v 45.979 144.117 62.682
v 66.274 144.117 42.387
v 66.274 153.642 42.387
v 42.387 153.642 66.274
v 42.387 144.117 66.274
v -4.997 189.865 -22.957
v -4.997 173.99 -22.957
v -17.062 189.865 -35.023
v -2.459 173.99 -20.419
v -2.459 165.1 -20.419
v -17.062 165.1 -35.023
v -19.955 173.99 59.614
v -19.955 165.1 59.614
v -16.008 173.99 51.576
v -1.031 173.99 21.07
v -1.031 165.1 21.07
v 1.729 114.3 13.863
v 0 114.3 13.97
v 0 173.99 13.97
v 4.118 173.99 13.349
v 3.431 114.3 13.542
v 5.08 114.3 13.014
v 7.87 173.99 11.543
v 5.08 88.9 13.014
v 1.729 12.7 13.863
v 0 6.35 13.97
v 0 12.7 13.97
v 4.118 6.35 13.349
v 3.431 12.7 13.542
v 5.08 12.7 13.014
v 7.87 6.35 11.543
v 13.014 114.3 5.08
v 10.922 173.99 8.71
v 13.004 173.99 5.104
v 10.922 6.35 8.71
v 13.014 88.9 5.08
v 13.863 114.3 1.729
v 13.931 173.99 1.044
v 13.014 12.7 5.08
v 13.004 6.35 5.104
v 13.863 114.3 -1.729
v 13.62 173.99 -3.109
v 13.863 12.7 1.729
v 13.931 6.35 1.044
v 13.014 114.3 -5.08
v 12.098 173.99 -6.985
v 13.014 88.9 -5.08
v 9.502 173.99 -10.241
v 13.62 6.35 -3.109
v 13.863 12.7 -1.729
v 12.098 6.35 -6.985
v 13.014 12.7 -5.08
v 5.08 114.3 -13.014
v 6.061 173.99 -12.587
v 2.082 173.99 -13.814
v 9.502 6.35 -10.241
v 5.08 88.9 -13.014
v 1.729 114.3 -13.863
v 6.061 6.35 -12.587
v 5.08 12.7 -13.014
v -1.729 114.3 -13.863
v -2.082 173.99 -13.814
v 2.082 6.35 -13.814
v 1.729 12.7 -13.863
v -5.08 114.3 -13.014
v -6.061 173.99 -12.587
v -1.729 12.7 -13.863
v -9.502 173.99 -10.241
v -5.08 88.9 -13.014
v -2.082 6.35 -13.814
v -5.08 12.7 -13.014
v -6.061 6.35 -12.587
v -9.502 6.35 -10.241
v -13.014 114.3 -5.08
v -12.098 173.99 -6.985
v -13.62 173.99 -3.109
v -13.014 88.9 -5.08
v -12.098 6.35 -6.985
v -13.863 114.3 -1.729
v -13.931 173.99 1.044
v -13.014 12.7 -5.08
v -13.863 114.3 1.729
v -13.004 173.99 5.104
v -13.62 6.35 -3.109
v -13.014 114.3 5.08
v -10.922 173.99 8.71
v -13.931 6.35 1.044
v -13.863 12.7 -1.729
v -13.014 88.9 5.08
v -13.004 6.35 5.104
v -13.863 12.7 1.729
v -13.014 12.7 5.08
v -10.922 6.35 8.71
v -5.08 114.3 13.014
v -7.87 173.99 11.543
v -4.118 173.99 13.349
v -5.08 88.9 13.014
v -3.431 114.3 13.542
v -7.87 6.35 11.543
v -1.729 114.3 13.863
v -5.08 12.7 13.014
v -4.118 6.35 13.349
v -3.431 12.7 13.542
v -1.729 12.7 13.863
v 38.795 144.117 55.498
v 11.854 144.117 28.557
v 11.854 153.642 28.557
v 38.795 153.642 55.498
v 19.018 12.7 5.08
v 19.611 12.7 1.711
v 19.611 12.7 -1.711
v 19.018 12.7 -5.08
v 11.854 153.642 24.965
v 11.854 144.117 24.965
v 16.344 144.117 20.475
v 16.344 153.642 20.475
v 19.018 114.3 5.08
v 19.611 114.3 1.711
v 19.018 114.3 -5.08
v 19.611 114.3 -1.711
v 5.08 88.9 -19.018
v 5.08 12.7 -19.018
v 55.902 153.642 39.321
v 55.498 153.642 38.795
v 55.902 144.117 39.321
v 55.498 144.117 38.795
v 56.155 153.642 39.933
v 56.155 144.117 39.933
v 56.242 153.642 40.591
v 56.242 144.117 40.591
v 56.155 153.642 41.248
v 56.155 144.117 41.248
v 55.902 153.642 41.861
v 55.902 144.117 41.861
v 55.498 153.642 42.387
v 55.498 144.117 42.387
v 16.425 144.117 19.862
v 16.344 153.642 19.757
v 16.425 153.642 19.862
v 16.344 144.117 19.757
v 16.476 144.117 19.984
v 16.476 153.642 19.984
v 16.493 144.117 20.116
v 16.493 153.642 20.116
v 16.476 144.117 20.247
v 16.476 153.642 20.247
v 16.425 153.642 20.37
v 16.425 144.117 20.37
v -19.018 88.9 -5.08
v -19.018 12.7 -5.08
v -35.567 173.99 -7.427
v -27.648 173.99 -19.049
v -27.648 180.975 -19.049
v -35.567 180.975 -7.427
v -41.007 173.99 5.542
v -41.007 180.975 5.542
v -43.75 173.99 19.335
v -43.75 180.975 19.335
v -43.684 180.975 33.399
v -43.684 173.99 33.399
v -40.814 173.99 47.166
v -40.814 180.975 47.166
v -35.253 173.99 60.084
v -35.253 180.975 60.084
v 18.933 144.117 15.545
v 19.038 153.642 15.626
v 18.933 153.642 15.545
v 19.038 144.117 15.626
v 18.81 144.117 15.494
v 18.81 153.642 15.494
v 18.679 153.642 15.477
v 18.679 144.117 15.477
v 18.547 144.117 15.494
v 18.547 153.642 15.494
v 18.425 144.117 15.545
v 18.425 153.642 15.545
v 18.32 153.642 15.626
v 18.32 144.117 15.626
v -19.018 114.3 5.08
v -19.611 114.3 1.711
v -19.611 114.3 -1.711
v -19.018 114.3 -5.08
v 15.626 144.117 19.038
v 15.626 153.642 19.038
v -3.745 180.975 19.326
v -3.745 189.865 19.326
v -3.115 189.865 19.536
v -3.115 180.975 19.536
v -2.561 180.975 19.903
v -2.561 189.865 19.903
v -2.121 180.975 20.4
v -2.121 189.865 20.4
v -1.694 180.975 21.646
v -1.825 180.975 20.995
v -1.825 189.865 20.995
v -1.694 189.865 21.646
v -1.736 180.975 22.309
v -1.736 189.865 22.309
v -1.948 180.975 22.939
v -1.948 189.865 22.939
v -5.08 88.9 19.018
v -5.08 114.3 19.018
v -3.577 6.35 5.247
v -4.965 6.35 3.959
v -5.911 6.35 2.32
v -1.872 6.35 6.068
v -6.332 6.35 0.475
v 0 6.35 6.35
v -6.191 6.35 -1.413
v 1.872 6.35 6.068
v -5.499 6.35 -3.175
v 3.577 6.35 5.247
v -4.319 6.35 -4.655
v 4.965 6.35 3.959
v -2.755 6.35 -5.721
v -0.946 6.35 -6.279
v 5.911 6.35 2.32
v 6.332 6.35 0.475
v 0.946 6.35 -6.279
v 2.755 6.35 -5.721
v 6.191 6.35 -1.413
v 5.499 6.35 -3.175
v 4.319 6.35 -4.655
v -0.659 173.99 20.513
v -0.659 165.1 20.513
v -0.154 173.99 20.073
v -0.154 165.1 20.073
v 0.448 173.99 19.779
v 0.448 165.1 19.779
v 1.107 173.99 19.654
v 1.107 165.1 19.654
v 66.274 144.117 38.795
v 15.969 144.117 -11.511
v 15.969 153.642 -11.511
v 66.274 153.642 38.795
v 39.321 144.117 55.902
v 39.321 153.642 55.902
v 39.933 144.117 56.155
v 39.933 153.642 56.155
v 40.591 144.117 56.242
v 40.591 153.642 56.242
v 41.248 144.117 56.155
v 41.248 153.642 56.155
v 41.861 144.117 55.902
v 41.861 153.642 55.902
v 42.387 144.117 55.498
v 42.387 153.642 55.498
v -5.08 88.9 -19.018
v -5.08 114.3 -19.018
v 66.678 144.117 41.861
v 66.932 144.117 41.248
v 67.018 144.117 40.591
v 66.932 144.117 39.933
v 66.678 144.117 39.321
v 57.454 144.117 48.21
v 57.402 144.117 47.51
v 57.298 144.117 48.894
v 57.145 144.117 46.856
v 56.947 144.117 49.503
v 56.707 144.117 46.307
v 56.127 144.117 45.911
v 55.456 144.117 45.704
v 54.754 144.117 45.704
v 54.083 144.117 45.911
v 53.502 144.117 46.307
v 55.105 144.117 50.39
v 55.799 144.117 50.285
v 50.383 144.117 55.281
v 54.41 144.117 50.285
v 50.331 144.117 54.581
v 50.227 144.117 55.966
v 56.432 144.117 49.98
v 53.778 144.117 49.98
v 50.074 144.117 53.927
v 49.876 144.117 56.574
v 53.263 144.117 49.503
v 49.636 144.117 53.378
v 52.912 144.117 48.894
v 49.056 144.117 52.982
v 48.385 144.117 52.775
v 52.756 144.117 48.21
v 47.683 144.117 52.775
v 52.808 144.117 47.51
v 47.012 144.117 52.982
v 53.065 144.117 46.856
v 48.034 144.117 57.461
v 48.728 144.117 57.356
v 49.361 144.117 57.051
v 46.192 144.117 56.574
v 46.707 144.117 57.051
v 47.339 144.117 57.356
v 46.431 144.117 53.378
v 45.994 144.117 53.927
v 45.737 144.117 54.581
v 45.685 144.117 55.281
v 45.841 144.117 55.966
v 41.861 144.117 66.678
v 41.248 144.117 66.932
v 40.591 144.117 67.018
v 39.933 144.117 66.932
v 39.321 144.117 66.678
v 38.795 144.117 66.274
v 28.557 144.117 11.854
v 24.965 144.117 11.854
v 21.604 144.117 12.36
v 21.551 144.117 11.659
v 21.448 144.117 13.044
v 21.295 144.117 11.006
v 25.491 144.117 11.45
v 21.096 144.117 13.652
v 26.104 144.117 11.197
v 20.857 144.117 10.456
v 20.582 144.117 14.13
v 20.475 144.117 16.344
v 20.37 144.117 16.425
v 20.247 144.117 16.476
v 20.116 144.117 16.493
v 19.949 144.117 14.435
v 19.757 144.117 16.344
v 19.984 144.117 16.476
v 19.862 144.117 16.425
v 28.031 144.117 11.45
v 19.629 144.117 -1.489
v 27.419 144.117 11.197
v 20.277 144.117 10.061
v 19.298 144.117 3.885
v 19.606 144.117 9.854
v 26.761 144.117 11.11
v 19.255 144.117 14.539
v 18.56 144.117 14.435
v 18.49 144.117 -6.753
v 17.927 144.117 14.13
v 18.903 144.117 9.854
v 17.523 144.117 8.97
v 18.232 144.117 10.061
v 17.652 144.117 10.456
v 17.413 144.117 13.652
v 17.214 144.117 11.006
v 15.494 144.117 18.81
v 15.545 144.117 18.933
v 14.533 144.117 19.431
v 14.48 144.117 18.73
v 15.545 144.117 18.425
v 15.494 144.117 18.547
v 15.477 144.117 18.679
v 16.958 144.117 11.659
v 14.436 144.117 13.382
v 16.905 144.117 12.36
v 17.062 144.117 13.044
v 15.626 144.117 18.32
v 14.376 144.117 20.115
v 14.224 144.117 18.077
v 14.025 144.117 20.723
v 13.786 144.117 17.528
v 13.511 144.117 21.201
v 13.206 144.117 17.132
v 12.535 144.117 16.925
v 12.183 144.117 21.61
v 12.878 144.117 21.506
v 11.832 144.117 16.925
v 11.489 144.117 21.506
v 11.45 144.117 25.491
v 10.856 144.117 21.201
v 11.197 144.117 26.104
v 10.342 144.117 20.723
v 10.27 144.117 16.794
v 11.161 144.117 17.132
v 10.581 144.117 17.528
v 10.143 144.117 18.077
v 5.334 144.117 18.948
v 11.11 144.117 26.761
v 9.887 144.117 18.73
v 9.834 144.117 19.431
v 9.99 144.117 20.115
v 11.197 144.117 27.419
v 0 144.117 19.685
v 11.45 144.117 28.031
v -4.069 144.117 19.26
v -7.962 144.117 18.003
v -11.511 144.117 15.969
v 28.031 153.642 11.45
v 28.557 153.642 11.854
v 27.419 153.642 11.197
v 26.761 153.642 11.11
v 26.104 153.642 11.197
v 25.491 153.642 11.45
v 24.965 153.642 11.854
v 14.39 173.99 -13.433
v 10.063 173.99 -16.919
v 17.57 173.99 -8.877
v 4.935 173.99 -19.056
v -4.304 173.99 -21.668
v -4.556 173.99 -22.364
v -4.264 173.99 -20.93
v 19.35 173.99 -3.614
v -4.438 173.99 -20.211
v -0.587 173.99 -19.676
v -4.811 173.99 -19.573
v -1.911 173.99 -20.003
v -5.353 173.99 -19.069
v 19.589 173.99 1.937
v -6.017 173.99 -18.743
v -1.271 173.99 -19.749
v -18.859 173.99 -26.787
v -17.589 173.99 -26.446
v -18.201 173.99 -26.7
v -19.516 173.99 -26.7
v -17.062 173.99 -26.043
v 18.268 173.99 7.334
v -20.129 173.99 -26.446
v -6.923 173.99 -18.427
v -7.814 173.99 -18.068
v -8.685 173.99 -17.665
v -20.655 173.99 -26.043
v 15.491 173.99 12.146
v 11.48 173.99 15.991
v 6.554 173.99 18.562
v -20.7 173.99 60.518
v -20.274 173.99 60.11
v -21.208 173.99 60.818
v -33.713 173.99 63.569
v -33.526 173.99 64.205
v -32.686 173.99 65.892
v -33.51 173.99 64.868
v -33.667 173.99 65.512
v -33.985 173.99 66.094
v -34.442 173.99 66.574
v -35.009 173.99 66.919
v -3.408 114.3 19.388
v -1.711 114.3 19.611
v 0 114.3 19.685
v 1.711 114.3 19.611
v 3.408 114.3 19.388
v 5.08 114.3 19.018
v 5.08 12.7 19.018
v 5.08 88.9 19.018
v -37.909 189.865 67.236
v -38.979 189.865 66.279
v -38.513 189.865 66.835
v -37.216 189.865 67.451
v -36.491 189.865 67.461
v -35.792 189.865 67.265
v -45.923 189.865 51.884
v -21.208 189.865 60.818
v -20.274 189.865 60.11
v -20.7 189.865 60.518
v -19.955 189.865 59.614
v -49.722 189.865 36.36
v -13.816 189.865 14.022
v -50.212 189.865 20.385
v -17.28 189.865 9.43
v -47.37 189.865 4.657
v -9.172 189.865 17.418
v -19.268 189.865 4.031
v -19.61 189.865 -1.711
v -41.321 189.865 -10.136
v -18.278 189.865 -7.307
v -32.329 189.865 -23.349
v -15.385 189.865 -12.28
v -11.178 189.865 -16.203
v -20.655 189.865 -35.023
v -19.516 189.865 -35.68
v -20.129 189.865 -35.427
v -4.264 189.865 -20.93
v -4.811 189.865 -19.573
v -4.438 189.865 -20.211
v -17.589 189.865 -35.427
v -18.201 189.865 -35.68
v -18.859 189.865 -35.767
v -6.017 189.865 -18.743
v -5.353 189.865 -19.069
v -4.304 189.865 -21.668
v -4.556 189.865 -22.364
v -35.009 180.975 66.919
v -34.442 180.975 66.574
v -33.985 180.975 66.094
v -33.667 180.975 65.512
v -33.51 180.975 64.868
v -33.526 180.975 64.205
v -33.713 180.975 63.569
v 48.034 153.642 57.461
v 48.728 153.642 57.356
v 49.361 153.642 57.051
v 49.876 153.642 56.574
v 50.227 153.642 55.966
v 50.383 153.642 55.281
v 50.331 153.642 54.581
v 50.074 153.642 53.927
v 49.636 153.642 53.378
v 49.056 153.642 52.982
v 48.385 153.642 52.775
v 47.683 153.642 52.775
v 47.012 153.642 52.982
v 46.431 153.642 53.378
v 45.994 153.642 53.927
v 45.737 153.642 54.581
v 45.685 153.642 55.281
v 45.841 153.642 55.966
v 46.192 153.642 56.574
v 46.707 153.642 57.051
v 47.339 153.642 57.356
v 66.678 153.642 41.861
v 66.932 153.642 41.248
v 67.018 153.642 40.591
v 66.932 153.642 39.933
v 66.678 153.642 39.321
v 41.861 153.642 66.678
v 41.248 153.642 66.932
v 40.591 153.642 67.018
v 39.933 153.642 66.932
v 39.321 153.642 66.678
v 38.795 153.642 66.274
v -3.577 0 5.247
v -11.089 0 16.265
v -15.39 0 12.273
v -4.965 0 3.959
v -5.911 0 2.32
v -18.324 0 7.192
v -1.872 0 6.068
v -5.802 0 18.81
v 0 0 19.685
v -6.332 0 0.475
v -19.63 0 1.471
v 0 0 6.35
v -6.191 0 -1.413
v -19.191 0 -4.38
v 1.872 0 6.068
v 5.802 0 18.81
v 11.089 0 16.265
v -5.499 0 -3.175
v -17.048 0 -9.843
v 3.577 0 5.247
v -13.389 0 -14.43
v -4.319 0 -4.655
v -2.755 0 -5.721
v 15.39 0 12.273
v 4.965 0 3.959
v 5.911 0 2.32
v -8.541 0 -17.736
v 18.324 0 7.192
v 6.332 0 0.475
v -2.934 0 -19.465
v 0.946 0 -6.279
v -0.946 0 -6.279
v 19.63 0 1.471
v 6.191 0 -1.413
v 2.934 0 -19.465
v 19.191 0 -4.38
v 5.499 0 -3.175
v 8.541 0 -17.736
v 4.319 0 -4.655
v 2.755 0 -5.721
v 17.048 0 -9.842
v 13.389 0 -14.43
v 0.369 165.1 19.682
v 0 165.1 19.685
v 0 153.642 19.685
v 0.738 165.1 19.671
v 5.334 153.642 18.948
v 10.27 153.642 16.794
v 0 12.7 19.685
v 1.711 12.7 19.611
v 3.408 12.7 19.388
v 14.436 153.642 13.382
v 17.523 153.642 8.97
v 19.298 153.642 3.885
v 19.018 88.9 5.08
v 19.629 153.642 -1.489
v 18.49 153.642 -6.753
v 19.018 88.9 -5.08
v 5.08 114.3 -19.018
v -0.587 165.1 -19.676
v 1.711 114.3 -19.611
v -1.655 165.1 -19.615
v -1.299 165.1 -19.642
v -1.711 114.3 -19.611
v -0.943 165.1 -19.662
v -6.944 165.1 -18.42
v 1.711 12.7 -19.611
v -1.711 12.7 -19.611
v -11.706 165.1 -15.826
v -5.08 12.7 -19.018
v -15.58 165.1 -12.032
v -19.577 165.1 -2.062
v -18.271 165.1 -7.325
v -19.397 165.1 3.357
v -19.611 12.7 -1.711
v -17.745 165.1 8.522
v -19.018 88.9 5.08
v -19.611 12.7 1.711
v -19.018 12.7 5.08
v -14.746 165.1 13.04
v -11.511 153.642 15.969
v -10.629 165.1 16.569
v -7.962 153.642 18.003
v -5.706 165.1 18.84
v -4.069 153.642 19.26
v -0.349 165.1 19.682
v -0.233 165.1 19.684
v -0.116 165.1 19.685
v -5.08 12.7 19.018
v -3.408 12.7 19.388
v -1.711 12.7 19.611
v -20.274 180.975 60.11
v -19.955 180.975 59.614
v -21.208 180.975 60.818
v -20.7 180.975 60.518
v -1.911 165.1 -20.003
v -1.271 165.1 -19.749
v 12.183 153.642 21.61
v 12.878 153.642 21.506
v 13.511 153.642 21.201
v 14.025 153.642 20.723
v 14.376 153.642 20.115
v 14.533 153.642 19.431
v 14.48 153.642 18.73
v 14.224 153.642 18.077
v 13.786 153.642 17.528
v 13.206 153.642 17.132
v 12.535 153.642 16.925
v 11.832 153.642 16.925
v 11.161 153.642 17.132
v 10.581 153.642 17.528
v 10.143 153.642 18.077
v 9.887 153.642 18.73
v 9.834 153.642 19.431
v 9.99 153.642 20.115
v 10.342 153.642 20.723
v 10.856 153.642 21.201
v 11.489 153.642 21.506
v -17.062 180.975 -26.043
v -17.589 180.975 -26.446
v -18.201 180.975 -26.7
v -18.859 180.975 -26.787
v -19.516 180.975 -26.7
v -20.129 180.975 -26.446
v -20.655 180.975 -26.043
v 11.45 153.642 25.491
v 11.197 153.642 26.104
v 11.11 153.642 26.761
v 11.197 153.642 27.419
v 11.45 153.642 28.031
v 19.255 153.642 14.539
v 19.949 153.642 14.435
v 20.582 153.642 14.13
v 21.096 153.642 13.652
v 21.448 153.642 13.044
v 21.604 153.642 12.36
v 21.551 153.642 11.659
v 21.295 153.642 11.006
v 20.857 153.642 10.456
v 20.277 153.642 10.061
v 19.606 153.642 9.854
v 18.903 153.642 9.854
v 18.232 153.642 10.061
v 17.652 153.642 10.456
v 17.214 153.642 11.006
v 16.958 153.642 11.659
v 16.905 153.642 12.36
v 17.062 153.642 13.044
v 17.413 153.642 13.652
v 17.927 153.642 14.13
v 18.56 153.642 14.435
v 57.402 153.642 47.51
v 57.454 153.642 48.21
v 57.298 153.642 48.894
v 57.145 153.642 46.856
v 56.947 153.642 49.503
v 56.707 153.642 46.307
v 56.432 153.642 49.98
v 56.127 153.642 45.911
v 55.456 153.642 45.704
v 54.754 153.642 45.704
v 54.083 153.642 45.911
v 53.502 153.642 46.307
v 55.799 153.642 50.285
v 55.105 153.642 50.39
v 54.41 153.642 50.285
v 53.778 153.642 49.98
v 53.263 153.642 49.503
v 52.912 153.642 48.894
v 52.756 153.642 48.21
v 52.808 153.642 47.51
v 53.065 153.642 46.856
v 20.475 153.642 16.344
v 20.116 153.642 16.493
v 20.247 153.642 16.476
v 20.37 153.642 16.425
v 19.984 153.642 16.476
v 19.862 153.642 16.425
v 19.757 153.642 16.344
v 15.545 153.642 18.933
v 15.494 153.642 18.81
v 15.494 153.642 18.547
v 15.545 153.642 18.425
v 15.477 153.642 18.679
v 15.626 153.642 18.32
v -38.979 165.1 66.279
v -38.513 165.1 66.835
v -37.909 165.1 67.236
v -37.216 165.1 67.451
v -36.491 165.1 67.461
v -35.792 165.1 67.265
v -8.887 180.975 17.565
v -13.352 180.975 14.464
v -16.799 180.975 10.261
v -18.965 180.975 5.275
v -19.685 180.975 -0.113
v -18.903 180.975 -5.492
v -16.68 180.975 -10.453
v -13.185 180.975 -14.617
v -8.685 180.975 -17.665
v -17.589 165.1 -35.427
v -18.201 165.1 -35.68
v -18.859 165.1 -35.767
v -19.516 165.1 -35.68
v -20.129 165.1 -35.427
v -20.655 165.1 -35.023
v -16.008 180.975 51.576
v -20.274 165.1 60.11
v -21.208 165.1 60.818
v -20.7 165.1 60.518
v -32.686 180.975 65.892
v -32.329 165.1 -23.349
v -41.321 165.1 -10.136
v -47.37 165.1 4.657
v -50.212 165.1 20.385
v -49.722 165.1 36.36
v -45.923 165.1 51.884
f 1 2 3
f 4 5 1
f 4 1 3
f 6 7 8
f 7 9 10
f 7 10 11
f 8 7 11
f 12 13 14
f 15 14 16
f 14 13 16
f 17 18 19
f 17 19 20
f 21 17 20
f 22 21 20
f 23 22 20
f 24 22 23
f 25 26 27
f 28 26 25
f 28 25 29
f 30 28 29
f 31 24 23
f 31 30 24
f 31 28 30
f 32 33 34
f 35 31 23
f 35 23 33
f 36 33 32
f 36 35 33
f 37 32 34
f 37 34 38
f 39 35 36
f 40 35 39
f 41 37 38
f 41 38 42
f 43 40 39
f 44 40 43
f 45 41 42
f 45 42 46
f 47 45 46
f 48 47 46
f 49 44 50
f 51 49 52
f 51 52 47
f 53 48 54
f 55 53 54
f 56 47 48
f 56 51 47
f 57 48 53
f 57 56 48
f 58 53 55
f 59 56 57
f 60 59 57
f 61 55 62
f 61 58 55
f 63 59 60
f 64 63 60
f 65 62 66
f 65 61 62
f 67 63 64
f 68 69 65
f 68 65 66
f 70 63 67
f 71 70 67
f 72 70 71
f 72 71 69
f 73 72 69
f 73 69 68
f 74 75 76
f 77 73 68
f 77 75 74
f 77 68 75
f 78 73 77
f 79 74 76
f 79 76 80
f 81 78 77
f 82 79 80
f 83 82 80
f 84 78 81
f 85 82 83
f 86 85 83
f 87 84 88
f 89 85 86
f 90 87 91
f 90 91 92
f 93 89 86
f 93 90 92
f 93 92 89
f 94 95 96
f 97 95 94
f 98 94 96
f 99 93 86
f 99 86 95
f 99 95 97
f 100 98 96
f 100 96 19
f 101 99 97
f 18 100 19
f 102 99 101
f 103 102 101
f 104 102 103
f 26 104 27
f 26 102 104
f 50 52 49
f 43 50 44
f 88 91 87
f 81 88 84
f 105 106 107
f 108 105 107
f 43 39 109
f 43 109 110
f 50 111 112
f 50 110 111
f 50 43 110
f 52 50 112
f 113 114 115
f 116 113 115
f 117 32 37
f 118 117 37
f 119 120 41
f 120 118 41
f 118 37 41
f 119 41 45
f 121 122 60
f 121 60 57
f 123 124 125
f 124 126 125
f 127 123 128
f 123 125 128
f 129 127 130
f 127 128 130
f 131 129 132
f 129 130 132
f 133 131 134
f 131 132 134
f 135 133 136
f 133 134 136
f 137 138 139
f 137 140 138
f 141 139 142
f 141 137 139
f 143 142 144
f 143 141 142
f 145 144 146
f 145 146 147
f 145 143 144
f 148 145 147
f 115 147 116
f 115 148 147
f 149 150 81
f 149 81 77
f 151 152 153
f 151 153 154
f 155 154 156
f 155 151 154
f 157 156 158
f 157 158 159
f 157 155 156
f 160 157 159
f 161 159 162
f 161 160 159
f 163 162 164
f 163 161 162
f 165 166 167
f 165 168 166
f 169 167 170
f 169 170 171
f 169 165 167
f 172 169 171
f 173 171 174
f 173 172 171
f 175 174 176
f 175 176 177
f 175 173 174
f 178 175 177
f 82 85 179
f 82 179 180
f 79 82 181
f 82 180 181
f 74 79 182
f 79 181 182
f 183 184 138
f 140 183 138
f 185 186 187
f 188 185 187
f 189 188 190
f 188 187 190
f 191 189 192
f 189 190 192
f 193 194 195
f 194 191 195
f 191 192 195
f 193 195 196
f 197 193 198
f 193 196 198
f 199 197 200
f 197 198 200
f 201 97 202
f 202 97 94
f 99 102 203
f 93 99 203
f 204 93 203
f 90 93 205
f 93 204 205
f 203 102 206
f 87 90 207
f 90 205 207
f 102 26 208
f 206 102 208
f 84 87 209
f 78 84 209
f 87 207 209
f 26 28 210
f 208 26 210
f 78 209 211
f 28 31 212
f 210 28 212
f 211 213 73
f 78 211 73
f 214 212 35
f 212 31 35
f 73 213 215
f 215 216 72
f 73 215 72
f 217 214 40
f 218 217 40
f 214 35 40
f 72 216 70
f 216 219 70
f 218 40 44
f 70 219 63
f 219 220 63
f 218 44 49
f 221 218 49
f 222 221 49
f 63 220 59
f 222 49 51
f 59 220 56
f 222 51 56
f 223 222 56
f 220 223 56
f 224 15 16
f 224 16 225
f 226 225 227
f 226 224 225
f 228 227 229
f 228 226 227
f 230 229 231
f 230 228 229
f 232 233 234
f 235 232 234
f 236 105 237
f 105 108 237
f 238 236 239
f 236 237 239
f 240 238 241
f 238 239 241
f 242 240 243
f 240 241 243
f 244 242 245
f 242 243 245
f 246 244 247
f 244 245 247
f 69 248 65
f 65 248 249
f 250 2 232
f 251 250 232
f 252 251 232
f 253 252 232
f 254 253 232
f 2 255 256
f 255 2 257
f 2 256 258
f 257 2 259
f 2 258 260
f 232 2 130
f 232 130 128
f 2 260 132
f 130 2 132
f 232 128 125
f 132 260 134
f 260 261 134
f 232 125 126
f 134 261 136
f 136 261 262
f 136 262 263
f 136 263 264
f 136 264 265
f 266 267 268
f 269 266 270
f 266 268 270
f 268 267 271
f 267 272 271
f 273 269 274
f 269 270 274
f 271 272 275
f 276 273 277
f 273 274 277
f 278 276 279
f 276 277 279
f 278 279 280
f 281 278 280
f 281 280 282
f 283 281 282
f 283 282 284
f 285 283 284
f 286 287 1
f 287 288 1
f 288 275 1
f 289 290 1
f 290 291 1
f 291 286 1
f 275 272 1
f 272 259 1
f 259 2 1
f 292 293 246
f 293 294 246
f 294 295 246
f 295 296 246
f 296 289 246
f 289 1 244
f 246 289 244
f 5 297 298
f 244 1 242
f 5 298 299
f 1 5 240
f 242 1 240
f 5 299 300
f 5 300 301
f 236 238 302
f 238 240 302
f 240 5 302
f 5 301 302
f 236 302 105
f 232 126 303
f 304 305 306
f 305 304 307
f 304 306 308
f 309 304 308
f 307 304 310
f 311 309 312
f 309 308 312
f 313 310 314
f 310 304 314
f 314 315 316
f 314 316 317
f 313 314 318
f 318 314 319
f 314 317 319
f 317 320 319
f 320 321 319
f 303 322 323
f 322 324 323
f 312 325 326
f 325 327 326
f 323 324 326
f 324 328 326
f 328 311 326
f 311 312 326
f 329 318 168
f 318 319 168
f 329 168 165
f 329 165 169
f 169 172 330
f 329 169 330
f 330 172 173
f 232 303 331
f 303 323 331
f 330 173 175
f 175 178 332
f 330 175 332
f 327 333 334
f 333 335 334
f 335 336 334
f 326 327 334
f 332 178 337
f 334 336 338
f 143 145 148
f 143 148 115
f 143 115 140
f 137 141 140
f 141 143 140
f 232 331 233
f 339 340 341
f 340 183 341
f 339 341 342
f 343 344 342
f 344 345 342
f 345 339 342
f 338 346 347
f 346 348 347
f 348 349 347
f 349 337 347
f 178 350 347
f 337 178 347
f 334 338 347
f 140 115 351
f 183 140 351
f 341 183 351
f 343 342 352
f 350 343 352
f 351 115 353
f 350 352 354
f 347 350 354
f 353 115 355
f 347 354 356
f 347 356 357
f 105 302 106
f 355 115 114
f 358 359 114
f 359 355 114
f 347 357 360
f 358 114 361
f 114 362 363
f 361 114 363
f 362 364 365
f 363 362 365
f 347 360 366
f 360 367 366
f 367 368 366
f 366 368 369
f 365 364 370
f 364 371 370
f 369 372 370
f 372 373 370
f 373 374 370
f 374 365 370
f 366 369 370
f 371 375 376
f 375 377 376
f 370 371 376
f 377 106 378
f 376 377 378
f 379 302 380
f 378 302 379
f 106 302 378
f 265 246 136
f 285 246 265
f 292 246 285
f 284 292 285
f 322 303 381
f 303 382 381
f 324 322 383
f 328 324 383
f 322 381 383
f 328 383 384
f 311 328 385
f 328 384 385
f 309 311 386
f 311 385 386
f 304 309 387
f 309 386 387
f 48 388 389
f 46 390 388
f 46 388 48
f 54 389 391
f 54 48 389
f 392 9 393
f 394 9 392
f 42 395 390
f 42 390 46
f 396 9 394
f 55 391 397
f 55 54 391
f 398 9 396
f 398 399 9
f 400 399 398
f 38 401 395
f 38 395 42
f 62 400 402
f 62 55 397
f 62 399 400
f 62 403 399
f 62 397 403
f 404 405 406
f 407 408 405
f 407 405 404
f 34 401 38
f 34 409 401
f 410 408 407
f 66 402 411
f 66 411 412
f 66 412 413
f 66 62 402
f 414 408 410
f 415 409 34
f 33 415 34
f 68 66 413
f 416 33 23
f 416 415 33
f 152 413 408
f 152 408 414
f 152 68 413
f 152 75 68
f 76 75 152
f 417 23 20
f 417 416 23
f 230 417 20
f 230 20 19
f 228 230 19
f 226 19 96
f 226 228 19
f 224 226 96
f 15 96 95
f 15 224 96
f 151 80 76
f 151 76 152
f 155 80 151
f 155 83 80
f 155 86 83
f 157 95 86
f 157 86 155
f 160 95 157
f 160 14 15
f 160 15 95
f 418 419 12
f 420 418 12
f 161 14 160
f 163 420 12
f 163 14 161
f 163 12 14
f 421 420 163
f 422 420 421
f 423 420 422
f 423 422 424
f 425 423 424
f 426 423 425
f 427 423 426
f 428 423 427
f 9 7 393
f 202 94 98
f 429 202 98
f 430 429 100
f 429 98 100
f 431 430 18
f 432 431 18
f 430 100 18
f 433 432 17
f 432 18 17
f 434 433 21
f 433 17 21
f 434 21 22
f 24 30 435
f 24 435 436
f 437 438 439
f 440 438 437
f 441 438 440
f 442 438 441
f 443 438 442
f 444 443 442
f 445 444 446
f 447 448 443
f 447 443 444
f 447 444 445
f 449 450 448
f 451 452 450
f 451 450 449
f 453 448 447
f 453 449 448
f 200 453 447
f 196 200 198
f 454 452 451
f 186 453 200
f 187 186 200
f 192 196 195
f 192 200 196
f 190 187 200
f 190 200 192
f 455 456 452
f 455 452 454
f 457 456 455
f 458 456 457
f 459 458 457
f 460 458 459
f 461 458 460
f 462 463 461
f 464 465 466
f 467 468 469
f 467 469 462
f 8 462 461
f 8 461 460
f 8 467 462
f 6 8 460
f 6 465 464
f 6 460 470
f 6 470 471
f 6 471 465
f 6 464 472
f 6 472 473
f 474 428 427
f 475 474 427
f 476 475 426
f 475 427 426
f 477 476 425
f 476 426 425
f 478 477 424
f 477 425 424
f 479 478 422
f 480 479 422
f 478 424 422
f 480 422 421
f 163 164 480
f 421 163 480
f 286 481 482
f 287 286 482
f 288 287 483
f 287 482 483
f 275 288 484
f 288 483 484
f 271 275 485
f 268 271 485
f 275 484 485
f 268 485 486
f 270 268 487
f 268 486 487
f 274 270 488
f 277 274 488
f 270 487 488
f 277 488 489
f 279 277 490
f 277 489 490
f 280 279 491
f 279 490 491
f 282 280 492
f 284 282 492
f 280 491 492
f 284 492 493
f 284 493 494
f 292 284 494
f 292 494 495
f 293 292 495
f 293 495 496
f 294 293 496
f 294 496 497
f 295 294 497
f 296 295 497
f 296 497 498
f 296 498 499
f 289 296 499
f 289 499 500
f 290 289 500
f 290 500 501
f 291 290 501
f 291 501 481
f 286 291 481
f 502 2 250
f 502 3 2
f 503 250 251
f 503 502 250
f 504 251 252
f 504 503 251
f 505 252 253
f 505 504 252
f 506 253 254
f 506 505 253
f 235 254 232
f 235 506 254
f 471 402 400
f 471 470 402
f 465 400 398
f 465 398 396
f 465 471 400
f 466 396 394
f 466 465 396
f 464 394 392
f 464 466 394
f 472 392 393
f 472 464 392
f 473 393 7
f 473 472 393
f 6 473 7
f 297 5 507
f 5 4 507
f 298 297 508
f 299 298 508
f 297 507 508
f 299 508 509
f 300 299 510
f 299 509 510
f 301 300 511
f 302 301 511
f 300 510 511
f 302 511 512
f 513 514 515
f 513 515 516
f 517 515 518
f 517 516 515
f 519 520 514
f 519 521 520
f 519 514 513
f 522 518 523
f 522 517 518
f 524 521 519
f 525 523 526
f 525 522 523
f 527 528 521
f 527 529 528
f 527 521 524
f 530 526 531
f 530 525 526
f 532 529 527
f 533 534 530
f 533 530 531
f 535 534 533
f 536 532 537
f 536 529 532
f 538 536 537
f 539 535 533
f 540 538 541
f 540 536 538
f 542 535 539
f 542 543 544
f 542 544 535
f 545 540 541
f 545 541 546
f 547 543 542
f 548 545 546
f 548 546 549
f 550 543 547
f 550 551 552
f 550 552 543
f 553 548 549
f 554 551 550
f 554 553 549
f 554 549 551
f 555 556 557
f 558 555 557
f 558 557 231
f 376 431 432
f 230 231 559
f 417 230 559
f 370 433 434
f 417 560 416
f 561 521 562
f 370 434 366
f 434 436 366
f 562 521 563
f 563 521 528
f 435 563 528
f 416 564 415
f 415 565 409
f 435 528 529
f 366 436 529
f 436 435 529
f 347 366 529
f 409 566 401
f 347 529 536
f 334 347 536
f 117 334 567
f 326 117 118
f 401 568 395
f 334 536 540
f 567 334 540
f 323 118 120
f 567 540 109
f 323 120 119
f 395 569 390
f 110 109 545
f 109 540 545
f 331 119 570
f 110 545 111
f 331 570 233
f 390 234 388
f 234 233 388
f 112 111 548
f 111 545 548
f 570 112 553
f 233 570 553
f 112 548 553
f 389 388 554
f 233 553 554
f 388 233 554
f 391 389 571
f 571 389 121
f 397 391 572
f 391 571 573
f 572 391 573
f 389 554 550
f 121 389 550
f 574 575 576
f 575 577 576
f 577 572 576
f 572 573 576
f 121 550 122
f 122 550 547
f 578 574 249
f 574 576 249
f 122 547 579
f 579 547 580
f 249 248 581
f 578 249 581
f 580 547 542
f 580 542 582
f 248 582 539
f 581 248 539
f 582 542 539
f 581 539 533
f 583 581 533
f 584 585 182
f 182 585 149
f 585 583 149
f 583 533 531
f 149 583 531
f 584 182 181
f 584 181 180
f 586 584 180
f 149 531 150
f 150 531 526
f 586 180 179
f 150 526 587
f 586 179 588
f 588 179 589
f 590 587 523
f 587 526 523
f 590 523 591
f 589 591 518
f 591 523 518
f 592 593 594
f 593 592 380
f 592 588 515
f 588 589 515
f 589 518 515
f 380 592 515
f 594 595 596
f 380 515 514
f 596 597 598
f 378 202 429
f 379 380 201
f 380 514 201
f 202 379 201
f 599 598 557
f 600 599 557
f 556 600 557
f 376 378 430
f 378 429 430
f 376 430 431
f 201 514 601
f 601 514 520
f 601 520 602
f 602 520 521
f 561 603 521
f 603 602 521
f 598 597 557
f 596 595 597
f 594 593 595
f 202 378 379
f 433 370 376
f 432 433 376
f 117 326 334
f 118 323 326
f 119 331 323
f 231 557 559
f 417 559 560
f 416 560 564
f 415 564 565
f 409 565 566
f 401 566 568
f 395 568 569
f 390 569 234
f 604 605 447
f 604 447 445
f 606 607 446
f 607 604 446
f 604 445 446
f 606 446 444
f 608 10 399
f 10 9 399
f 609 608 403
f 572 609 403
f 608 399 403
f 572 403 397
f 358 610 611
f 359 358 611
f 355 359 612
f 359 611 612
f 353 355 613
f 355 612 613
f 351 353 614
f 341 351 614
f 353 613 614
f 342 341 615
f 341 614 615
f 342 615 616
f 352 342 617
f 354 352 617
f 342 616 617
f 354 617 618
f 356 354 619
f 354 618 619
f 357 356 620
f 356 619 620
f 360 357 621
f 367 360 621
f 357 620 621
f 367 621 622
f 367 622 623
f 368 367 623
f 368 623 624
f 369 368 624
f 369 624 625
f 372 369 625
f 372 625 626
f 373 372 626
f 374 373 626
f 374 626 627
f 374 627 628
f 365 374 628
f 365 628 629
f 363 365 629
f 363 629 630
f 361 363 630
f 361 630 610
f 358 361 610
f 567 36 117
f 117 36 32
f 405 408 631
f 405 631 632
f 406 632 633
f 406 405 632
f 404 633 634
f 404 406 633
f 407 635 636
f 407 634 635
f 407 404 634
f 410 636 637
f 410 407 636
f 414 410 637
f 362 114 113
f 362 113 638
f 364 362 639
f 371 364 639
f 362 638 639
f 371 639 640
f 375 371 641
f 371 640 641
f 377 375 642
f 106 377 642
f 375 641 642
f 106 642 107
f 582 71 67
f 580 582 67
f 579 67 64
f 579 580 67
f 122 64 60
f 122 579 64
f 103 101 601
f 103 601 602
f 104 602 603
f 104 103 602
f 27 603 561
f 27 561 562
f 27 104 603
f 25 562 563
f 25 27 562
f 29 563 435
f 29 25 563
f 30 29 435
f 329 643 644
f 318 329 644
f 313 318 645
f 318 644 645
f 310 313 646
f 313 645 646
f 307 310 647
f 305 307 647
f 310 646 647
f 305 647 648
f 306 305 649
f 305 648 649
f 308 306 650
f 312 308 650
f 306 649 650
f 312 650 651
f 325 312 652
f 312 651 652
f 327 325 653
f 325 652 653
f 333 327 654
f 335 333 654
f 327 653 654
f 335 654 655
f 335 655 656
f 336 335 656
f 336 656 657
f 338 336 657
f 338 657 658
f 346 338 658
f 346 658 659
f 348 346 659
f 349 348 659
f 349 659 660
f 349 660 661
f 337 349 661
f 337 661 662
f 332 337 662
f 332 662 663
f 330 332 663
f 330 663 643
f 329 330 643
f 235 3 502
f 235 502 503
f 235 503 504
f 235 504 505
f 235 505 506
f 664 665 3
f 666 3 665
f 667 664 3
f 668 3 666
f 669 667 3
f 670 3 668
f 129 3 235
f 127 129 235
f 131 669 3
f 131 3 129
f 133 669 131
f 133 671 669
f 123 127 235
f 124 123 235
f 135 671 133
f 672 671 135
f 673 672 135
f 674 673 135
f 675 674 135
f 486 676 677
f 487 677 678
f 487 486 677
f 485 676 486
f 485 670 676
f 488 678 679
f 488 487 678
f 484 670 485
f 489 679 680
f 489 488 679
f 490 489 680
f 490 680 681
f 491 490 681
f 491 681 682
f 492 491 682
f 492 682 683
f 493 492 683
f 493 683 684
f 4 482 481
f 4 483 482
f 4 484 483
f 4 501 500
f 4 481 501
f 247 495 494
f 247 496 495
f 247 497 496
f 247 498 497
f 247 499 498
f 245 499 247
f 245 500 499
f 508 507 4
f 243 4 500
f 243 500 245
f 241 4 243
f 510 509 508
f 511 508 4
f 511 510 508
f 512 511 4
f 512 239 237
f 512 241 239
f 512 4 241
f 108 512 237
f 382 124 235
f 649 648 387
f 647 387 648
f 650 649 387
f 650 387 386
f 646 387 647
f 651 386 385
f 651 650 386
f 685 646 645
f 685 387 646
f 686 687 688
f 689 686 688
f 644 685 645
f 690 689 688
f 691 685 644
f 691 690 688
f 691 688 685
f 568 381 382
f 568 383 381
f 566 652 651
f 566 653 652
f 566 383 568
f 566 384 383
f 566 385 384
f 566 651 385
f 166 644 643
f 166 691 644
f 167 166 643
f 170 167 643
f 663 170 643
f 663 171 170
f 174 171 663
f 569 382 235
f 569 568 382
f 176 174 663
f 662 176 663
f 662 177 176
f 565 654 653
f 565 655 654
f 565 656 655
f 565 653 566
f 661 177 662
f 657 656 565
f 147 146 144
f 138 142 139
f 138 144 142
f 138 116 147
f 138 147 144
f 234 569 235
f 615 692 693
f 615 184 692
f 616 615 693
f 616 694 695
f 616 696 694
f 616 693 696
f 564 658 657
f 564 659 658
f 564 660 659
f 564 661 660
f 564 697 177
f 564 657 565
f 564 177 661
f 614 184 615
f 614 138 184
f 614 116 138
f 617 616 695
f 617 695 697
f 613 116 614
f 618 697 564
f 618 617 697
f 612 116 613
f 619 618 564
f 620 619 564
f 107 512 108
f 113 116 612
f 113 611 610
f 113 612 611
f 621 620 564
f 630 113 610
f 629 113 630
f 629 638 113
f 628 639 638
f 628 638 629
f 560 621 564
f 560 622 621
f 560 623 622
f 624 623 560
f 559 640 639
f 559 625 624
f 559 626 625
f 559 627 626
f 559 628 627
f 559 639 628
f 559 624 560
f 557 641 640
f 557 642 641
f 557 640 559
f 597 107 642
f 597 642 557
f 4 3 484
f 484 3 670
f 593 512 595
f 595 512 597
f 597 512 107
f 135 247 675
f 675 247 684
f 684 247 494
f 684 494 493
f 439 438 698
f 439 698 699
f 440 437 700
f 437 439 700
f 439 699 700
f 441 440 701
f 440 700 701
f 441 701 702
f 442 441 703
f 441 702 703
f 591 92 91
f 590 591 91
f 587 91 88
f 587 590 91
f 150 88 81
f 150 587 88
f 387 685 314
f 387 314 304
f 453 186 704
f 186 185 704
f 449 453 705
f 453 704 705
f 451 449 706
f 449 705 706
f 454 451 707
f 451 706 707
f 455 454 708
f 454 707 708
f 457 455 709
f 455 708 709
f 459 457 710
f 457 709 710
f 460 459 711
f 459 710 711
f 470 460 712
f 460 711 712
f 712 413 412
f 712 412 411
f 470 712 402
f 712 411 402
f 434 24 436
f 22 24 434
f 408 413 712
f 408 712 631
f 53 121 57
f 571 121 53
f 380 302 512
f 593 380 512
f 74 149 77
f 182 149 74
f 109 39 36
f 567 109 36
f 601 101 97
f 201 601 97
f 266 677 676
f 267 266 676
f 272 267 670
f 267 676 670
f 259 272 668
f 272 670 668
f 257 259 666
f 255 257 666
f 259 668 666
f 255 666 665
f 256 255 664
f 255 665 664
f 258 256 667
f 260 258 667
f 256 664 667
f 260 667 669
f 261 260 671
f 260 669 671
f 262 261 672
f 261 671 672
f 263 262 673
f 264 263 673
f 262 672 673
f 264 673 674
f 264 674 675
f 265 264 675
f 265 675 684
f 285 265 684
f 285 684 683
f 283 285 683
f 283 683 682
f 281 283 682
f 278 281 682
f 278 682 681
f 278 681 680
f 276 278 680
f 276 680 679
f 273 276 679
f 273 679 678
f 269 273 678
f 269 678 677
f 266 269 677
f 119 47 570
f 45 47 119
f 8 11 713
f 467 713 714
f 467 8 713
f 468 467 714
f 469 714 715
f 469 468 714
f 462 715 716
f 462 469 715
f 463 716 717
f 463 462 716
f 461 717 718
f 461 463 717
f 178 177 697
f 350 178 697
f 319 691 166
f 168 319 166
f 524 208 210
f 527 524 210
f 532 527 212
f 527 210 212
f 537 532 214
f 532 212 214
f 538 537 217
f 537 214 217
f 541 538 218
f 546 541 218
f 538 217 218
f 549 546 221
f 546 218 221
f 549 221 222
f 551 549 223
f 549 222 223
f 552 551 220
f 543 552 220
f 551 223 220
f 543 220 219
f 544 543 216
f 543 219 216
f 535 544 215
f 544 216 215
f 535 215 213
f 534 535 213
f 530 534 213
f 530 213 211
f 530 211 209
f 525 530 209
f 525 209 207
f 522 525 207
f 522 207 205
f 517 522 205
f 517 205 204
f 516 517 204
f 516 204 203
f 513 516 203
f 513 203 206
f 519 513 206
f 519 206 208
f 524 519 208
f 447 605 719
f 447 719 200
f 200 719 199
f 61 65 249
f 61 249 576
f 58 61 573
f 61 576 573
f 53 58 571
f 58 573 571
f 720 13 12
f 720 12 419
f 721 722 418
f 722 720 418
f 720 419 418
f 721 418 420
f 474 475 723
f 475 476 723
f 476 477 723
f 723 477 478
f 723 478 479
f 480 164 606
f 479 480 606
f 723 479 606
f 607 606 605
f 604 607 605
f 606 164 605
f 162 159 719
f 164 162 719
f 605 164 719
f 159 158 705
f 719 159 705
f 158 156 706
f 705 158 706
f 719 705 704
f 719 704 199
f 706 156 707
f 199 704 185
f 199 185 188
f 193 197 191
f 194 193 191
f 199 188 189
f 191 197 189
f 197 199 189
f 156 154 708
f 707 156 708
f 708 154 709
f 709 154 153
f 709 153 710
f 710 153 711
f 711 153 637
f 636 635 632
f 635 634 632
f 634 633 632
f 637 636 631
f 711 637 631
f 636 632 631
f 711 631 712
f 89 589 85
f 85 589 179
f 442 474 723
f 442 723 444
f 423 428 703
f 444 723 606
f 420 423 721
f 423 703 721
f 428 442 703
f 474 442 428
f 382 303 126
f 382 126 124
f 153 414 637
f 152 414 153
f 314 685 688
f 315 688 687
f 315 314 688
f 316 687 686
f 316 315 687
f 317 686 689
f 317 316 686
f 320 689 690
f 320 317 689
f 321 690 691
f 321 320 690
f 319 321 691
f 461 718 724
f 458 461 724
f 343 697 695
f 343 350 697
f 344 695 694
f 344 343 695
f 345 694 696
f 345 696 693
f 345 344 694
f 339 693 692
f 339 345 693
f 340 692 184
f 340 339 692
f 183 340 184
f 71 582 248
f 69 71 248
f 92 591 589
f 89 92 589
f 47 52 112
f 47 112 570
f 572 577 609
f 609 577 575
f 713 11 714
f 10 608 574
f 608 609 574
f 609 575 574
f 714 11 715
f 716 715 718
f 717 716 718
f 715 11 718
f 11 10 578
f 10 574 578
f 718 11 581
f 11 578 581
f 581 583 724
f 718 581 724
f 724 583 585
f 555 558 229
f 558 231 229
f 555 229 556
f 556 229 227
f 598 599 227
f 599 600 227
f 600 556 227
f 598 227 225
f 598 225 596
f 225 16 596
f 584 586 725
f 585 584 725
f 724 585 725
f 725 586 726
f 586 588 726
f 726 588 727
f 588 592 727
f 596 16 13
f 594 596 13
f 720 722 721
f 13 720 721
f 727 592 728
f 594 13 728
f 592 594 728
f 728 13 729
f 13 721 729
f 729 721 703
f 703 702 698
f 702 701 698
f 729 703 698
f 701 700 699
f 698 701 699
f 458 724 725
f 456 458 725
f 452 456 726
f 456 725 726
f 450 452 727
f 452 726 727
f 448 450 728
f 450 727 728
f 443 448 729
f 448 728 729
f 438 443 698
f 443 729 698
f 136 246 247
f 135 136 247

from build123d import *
from build123d.topology import SkipClean

# Parameters (mm, degrees)
SKETCH1_R                            = 19.685
SKETCH1_R_2                          = 13.97
BOSS_EXTRUDE1_DEPTH                  = 173.99
SKETCH2_R                            = 13.97
BOSS_EXTRUDE2_DEPTH                  = 6.35
SKETCH7_R                            = 6.35
CUT_EXTRUDE4_DEPTH                   = 170.935776251
SKETCH9_W                            = 38.862
SKETCH9_H                            = 9.525
BOSS_EXTRUDE3_DEPTH                  = 6.35
BOSS_EXTRUDE3_DIRECTION_2_REACH      = 182.364
BOSS_EXTRUDE3_DIRECTION_2_END_RADIUS = 19.685
SKETCH10_W                           = 7.62
SKETCH10_H                           = 9.525
BOSS_EXTRUDE4_DEPTH                  = 50.8
BOSS_EXTRUDE5_REACH                  = 201.196
SKETCH11_W                           = 7.62
SKETCH11_H                           = 9.525
FILLET1_R                            = 2.54
CUT_EXTRUDE7_REACH                   = 182.524
SKETCH12_R                           = 2.35585
CUT_EXTRUDE9_REACH                   = 182.524
FILLET5_R                            = 0.508
BOSS_EXTRUDE6_DEPTH                  = 15.875
BOSS_EXTRUDE6_DEPTH_BACK             = 8.89
CUT_EXTRUDE10_DEPTH                  = 6.985
CUT_EXTRUDE11_DEPTH                  = 6.985
FILLET7_R                            = 2.54
FILLET8_R                            = 2.54
FILLET9_R                            = 2.54
CUT_EXTRUDE12_DEPTH                  = 213.353464491
CUT_EXTRUDE12_DEPTH_BACK             = 213.353464491
SKETCH5_W                            = 10.16
SKETCH5_H                            = 25.4
SKETCH5_H_2                          = 76.2
CUT_EXTRUDE13_DEPTH                  = 213.353464491
CUT_EXTRUDE13_DEPTH_BACK             = 213.353464491
SKETCH8_W                            = 10.16
SKETCH8_H                            = 25.4
SKETCH8_H_2                          = 76.2


with BuildPart() as part:
    # Sketch1 → Boss-Extrude1 (new body)
    with BuildSketch(Plane(origin=(0, 0, 0), x_dir=(1, 0, 0), z_dir=(0, 1, 0))):
        with Locations(Location((0, 0, 0), (0, 0, 270))):
            Circle(SKETCH1_R)
        with Locations(Location((0, 0, 0), (0, 0, 270))):
            Circle(SKETCH1_R_2, mode=Mode.SUBTRACT)
    extrude(amount=BOSS_EXTRUDE1_DEPTH)

    # Sketch2 → Boss-Extrude2 (add)
    with BuildSketch(Plane.XZ):
        with Locations(Location((0, 0, 0), (0, 0, 270))):
            Circle(SKETCH2_R)
    extrude(amount=-BOSS_EXTRUDE2_DEPTH)

    # Sketch7 → Cut-Extrude4 (cut, through all)
    with BuildSketch(Plane(origin=(0, 6.35, 0), x_dir=(1, 0, 0), z_dir=(0, 1, 0))):
        with Locations(Location((0, 0, 0), (0, 0, 270))):
            Circle(SKETCH7_R)
    extrude(amount=-CUT_EXTRUDE4_DEPTH, mode=Mode.SUBTRACT)

    # Sketch9 → Boss-Extrude3 (add)
    with BuildSketch(Plane(origin=(13.919396988, 0, 13.919396988), x_dir=(0.7071067811865476, 0, -0.7071067811865476), z_dir=(0.7071067811865476, 0, 0.7071067811865476))):
        with Locations((0, 148.8795)):
            Rectangle(SKETCH9_W, SKETCH9_H)
    extrude(amount=BOSS_EXTRUDE3_DEPTH)

    # Boss-Extrude3 direction 2: up to this cylinder (the profile starts outside it)
    boss_extrude3_direction_2_end = Plane(origin=(0, 148.8795, 0), z_dir=(0, -1, 0)) * Cylinder(BOSS_EXTRUDE3_DIRECTION_2_END_RADIUS, 405.098, mode=Mode.PRIVATE)
    # Sketch9 → Boss-Extrude3 direction 2 (add, up to the surface)
    with BuildSketch(Plane(origin=(13.919396988, 0, 13.919396988), x_dir=(0.7071067811865476, 0, -0.7071067811865476), z_dir=(0.7071067811865476, 0, 0.7071067811865476)), mode=Mode.PRIVATE) as boss_extrude3_direction_2_sk1:
        with Locations((0, 148.8795)):
            Rectangle(SKETCH9_W, SKETCH9_H)
    boss_extrude3_direction_2_tool1 = extrude(boss_extrude3_direction_2_sk1.sketch, amount=-BOSS_EXTRUDE3_DIRECTION_2_REACH, mode=Mode.PRIVATE) - boss_extrude3_direction_2_end
    add(boss_extrude3_direction_2_tool1.solids().sort_by_distance((13.919397, 148.8795, 13.919397))[0])
    add(boss_extrude3_direction_2_tool1.solids().sort_by_distance((13.919397, 148.8795, 13.919397))[1])

    # Sketch10 → Boss-Extrude4 (add)
    with BuildSketch(Plane(origin=(18.409525048, 0, 18.409525048), x_dir=(0.7071067811865481, 0, -0.707106781186547), z_dir=(0.707106781186547, 0, 0.7071067811865481))):
        with Locations((-15.621, 148.8795)):
            Rectangle(SKETCH10_W, SKETCH10_H)
        with Locations((15.621, 148.8795)):
            Rectangle(SKETCH10_W, SKETCH10_H)
    extrude(amount=BOSS_EXTRUDE4_DEPTH)

    # Sketch11 → Boss-Extrude5 (add, up to next)
    with BuildSketch(Plane(origin=(-8.351638193, 0, 8.351638193), x_dir=(-0.7071067811865471, 0, -0.7071067811865479), z_dir=(0.7071067811865479, 0, -0.7071067811865471)), mode=Mode.PRIVATE) as boss_extrude5_sk1:
        with Locations((-73.025, 148.8795)):
            Rectangle(SKETCH11_W, SKETCH11_H)
    boss_extrude5_tool1 = extrude(boss_extrude5_sk1.sketch, amount=BOSS_EXTRUDE5_REACH, mode=Mode.PRIVATE) - part.part
    add(boss_extrude5_tool1.solids().sort_by_distance((43.284835, 148.8795, 59.988111))[0])

    # Fillet1
    fillet1_edges = [part.edges().sort_by_distance(p)[0] for p in [
        (10.057886856, 148.8795, 26.761163241),
        (40.590757667, 148.8795, 68.070341398),
        (26.761163241, 148.8795, 10.057886856),
        (68.070341398, 148.8795, 40.590757667),
        (57.294034052, 148.8795, 40.590757667),
        (40.590757667, 148.8795, 57.294034052),
    ]]
    fillet(fillet1_edges, radius=FILLET1_R)

    # Sketch12 → Cut-Extrude7 (cut, up to next)
    with BuildSketch(Plane(origin=(0, 153.642, 0), x_dir=(1, 0, 0), z_dir=(0, 1, 0)), mode=Mode.PRIVATE) as cut_extrude7_sk1:
        with Locations(Location((48.033763646, -55.104831458, 0), (0, 0, 270))):
            Circle(SKETCH12_R)
    cut_extrude7_tool1 = extrude(cut_extrude7_sk1.sketch, amount=-CUT_EXTRUDE7_REACH, mode=Mode.PRIVATE) & part.part
    # Sketch12 → Cut-Extrude7 (cut, up to next)
    with BuildSketch(Plane(origin=(0, 153.642, 0), x_dir=(1, 0, 0), z_dir=(0, 1, 0)), mode=Mode.PRIVATE) as cut_extrude7_sk2:
        with Locations(Location((55.104831458, -48.033763646, 0), (0, 0, 270))):
            Circle(SKETCH12_R)
    cut_extrude7_tool2 = extrude(cut_extrude7_sk2.sketch, amount=-CUT_EXTRUDE7_REACH, mode=Mode.PRIVATE) & part.part
    # Sketch12 → Cut-Extrude7 (cut, up to next)
    with BuildSketch(Plane(origin=(0, 153.642, 0), x_dir=(1, 0, 0), z_dir=(0, 1, 0)), mode=Mode.PRIVATE) as cut_extrude7_sk3:
        with Locations(Location((19.254517652, -12.18344984, 0), (0, 0, 270))):
            Circle(SKETCH12_R)
    cut_extrude7_tool3 = extrude(cut_extrude7_sk3.sketch, amount=-CUT_EXTRUDE7_REACH, mode=Mode.PRIVATE) & part.part
    # Sketch12 → Cut-Extrude7 (cut, up to next)
    with BuildSketch(Plane(origin=(0, 153.642, 0), x_dir=(1, 0, 0), z_dir=(0, 1, 0)), mode=Mode.PRIVATE) as cut_extrude7_sk4:
        with Locations(Location((12.18344984, -19.254517652, 0), (0, 0, 270))):
            Circle(SKETCH12_R)
    cut_extrude7_tool4 = extrude(cut_extrude7_sk4.sketch, amount=-CUT_EXTRUDE7_REACH, mode=Mode.PRIVATE) & part.part
    add(cut_extrude7_tool1.solids().sort_by_distance((48.033764, 153.642, 55.104831))[0], mode=Mode.SUBTRACT)
    add(cut_extrude7_tool2.solids().sort_by_distance((55.104831, 153.642, 48.033764))[0], mode=Mode.SUBTRACT)
    add(cut_extrude7_tool3.solids().sort_by_distance((19.254518, 153.642, 12.18345))[0], mode=Mode.SUBTRACT)
    add(cut_extrude7_tool4.solids().sort_by_distance((12.18345, 153.642, 19.254518))[0], mode=Mode.SUBTRACT)

    # Sketch22 → Cut-Extrude9 (cut, up to next)
    with BuildSketch(Plane(origin=(0, 153.642, 0), x_dir=(1, 0, 0), z_dir=(0, 1, 0)), mode=Mode.PRIVATE) as cut_extrude9_sk1:
        Polygon((16.703276385, -20.115773711), (20.115773711, -16.703276385), (18.678932732, -15.266435406), (15.266435406, -18.678932732), align=None)
    cut_extrude9_tool1 = extrude(cut_extrude9_sk1.sketch, amount=-CUT_EXTRUDE9_REACH, mode=Mode.PRIVATE) & part.part
    add(cut_extrude9_tool1.solids().sort_by_distance((17.691105, 153.642, 17.691105))[0], mode=Mode.SUBTRACT)

    # Fillet5
    fillet5_edges = [part.edges().sort_by_distance(p)[0] for p in [
        (16.703276385, 148.8795, 20.115773711),
        (15.266435406, 148.8795, 18.678932732),
        (18.678932732, 148.8795, 15.266435406),
        (20.115773711, 148.8795, 16.703276385),
    ]]
    fillet(fillet5_edges, radius=FILLET5_R)

    # Sketch24 → Boss-Extrude6 (add, two sides: drawn at the far end of the back side and taken through both)
    with BuildSketch(Plane(origin=(0, 173.99, 0), x_dir=(1, 0, 0), z_dir=(0, 1, 0)).offset(-BOSS_EXTRUDE6_DEPTH_BACK)):
        with BuildLine():
            Line((-1.654809111, 19.615321354), (-18.858537854, 36.819050096))
            Line((-18.858537854, 36.819050096), (-32.328922036, 23.348665915))
            ThreePointArc((-32.328922036, 23.348665915), (-50.285766243, -21.490686658), (-37.785478501, -68.146432278))
            Line((-37.785478501, -68.146432278), (-20.362192025, -60.443732207))
            Line((-20.362192025, -60.443732207), (-0.348920906, -19.681907408))
            ThreePointArc((-0.348920906, -19.681907408), (-19.674139894, -0.653792342), (-1.654809111, 19.615321354))
        make_face()
    extrude(amount=BOSS_EXTRUDE6_DEPTH + BOSS_EXTRUDE6_DEPTH_BACK)

    # Sketch25 → Cut-Extrude10 (cut)
    with BuildSketch(Plane(origin=(0, 173.99, 0), x_dir=(1, 0, 0), z_dir=(0, 1, 0))):
        with BuildLine():
            ThreePointArc((-27.647974301, 19.049357529), (-43.749813849, -19.335310427), (-35.25310949, -60.084028026))
            Line((-35.25310949, -60.084028026), (-22.929758715, -54.635970049))
            Line((-22.929758715, -54.635970049), (-16.008337298, -51.576063222))
            Line((-16.008337298, -51.576063222), (-0.348920906, -19.681907408))
            ThreePointArc((-0.348920906, -19.681907408), (-19.212220786, -4.288332714), (-8.685165579, 17.665421701))
            Line((-8.685165579, 17.665421701), (-18.858537854, 27.838793975))
            Line((-18.858537854, 27.838793975), (-27.647974301, 19.049357529))
        make_face()
    extrude(amount=CUT_EXTRUDE10_DEPTH, mode=Mode.SUBTRACT)

    # Sketch25<3> → Cut-Extrude11 (cut)
    with BuildSketch(Plane(origin=(0, 173.99, 0), x_dir=(1, 0, 0), z_dir=(0, 1, 0))):
        Polygon((-22.929758715, -54.635970049), (-35.25310949, -60.084028026), (-32.6855428, -65.891790185), (-20.362192025, -60.443732207), (-16.008337298, -51.576063222), align=None)
    extrude(amount=CUT_EXTRUDE11_DEPTH, mode=Mode.SUBTRACT)

    # Fillet7
    # the kernel refuses this fillet: 2.54 mm, written as the material it adds along each edge
    with BuildSketch(Plane(origin=(-0.348920906, 173.99, 19.681907408), x_dir=(0.9998145543990907, 0, -0.01925764294371538), z_dir=(0, -1, 0))) as fillet7_piece_1:
        with BuildLine():
            CenterArc((1.549687123, 2.538262979), FILLET7_R, 207.253599252, 60.627317533)
            Line((-0.708343353, 1.375121386), (0, 0))
            ThreePointArc((0, 0), (0.727883346, 0.01346191), (1.455766692, 0))
        make_face()
    extrude(amount=8.89)
    with BuildSketch(Plane(origin=(-18.858537854, 167.64, -27.838793975), x_dir=(-0.7071067811865475, 0, 0.7071067811865475), z_dir=(0, 1, 0))) as fillet7_piece_2:
        with BuildLine():
            CenterArc((FILLET7_R, FILLET7_R), FILLET7_R, 180, 90)
            Line((0, FILLET7_R), (0, 0))
            Line((0, 0), (FILLET7_R, 0))
        make_face()
    extrude(amount=19.685)
    # the kernel refuses this fillet: 2.54 mm, written as the material it takes off along each edge
    with BuildSketch(Plane(origin=(-0.348920906, 198.935116734, 19.681907408), x_dir=(-0.4407250194044606, 0, 0.8976421654929864), z_dir=(0, -1, 0))) as fillet7_2_piece_1_section:
        with BuildLine():
            CenterArc((3.628046694, 2.54), FILLET7_R, 164.816165864, 105.183834136)
            ThreePointArc((1.176716996, 3.205268904), (0.657985503, 1.577073014), (0, 0))
            Line((0, 0), (3.628046694, 0))
        make_face()
    fillet7_2_piece_1 = extrude(amount=27.030233469, mode=Mode.PRIVATE)
    fillet7_2_piece_1 = split(fillet7_2_piece_1, bisect_by=Plane(origin=(-1.547722255, 173.99, 20.415645586), z_dir=(0, 1, 0)), keep=Keep.TOP, mode=Mode.PRIVATE)
    add(fillet7_2_piece_1, mode=Mode.SUBTRACT)
    with BuildSketch(Plane(origin=(-37.785478501, 159.558530429, 68.146432278), x_dir=(-0.5384763243852061, 0, -0.8426406399388758), z_dir=(0, 1, 0))) as fillet7_2_piece_2:
        with BuildLine():
            CenterArc((2.179772309, -2.539733178), FILLET7_R, 89.169508748, 82.100366111)
            Line((-0.33079981, -2.154210626), (0, 0))
            ThreePointArc((0, 0), (1.108293914, 0.008032394), (2.216587829, 0))
        make_face()
    extrude(amount=35.847939143, mode=Mode.SUBTRACT)
    with BuildSketch(Plane(origin=(-20.362192025, 192.176210988, 60.443732207), x_dir=(-0.9146082139693783, 0, 0.40434121103313725), z_dir=(0, -1, 0)), Plane(origin=(-20.362192025, 176.301210988, 60.443732207), x_dir=(-0.9146082139693783, 0, 0.40434121103313725), z_dir=(0, -1, 0))) as fillet7_2_piece_3:
        with BuildLine():
            CenterArc((FILLET7_R * 0.363970234266, FILLET7_R), FILLET7_R, 230, 40)
            Line((-FILLET7_R * 0.27881737542, FILLET7_R * 0.233955556881), (0, 0))
            Line((0, 0), (FILLET7_R * 0.363970234266, 0))
        make_face()
    extrude(amount=13.512421975, mode=Mode.SUBTRACT)
    with BuildSketch(Plane(origin=(-32.6855428, 173.99, 65.891790185), x_dir=(-0.9146082139693789, 0, 0.4043412110331356), z_dir=(0, 1, 0))) as fillet7_2_piece_4:
        with BuildLine():
            CenterArc((FILLET7_R, -FILLET7_R), FILLET7_R, 90, 90)
            Line((0, -FILLET7_R), (0, 0))
            Line((0, 0), (FILLET7_R, 0))
        make_face()
    extrude(amount=6.985, mode=Mode.SUBTRACT)

    # Fillet8
    fillet8_edges = [part.edges().sort_by_distance(p)[0] for p in [
        (-1.654809111, 181.9275, -19.615321354),
        (-18.858537854, 177.4825, -36.819050096),
    ]]
    fillet(fillet8_edges, radius=FILLET8_R)

    # Fillet9
    fillet9_edges = [part.edges().sort_by_distance(p)[0] for p in [
        (-1.654809111, 169.545, -19.615321354),
    ]]
    fillet(fillet9_edges, radius=FILLET9_R)

    # Sketch5 → Cut-Extrude12 (cut, two sides: drawn at the far end of the back side and taken through both)
    with SkipClean():  # the faces are left unmerged after this step: merging them gives an invalid solid
        with BuildSketch(Plane(origin=(0, 0, 0), x_dir=(0, 0, -1), z_dir=(1, 0, 0)).offset(-CUT_EXTRUDE12_DEPTH_BACK)):
            with Locations((0, 101.6)):
                Rectangle(SKETCH5_W, SKETCH5_H)
            with Locations((0, 50.8)):
                Rectangle(SKETCH5_W, SKETCH5_H_2)
        extrude(amount=CUT_EXTRUDE12_DEPTH + CUT_EXTRUDE12_DEPTH_BACK, mode=Mode.SUBTRACT)

    # Sketch8 → Cut-Extrude13 (cut, two sides: drawn at the far end of the back side and taken through both)
    with SkipClean():  # the faces are left unmerged after this step: merging them gives an invalid solid
        with BuildSketch(Plane.XY.offset(-CUT_EXTRUDE13_DEPTH_BACK)):
            with Locations((0, 101.6)):
                Rectangle(SKETCH8_W, SKETCH8_H)
            with Locations((0, 50.8)):
                Rectangle(SKETCH8_W, SKETCH8_H_2)
        extrude(amount=CUT_EXTRUDE13_DEPTH + CUT_EXTRUDE13_DEPTH_BACK, mode=Mode.SUBTRACT)


solid = part.part
